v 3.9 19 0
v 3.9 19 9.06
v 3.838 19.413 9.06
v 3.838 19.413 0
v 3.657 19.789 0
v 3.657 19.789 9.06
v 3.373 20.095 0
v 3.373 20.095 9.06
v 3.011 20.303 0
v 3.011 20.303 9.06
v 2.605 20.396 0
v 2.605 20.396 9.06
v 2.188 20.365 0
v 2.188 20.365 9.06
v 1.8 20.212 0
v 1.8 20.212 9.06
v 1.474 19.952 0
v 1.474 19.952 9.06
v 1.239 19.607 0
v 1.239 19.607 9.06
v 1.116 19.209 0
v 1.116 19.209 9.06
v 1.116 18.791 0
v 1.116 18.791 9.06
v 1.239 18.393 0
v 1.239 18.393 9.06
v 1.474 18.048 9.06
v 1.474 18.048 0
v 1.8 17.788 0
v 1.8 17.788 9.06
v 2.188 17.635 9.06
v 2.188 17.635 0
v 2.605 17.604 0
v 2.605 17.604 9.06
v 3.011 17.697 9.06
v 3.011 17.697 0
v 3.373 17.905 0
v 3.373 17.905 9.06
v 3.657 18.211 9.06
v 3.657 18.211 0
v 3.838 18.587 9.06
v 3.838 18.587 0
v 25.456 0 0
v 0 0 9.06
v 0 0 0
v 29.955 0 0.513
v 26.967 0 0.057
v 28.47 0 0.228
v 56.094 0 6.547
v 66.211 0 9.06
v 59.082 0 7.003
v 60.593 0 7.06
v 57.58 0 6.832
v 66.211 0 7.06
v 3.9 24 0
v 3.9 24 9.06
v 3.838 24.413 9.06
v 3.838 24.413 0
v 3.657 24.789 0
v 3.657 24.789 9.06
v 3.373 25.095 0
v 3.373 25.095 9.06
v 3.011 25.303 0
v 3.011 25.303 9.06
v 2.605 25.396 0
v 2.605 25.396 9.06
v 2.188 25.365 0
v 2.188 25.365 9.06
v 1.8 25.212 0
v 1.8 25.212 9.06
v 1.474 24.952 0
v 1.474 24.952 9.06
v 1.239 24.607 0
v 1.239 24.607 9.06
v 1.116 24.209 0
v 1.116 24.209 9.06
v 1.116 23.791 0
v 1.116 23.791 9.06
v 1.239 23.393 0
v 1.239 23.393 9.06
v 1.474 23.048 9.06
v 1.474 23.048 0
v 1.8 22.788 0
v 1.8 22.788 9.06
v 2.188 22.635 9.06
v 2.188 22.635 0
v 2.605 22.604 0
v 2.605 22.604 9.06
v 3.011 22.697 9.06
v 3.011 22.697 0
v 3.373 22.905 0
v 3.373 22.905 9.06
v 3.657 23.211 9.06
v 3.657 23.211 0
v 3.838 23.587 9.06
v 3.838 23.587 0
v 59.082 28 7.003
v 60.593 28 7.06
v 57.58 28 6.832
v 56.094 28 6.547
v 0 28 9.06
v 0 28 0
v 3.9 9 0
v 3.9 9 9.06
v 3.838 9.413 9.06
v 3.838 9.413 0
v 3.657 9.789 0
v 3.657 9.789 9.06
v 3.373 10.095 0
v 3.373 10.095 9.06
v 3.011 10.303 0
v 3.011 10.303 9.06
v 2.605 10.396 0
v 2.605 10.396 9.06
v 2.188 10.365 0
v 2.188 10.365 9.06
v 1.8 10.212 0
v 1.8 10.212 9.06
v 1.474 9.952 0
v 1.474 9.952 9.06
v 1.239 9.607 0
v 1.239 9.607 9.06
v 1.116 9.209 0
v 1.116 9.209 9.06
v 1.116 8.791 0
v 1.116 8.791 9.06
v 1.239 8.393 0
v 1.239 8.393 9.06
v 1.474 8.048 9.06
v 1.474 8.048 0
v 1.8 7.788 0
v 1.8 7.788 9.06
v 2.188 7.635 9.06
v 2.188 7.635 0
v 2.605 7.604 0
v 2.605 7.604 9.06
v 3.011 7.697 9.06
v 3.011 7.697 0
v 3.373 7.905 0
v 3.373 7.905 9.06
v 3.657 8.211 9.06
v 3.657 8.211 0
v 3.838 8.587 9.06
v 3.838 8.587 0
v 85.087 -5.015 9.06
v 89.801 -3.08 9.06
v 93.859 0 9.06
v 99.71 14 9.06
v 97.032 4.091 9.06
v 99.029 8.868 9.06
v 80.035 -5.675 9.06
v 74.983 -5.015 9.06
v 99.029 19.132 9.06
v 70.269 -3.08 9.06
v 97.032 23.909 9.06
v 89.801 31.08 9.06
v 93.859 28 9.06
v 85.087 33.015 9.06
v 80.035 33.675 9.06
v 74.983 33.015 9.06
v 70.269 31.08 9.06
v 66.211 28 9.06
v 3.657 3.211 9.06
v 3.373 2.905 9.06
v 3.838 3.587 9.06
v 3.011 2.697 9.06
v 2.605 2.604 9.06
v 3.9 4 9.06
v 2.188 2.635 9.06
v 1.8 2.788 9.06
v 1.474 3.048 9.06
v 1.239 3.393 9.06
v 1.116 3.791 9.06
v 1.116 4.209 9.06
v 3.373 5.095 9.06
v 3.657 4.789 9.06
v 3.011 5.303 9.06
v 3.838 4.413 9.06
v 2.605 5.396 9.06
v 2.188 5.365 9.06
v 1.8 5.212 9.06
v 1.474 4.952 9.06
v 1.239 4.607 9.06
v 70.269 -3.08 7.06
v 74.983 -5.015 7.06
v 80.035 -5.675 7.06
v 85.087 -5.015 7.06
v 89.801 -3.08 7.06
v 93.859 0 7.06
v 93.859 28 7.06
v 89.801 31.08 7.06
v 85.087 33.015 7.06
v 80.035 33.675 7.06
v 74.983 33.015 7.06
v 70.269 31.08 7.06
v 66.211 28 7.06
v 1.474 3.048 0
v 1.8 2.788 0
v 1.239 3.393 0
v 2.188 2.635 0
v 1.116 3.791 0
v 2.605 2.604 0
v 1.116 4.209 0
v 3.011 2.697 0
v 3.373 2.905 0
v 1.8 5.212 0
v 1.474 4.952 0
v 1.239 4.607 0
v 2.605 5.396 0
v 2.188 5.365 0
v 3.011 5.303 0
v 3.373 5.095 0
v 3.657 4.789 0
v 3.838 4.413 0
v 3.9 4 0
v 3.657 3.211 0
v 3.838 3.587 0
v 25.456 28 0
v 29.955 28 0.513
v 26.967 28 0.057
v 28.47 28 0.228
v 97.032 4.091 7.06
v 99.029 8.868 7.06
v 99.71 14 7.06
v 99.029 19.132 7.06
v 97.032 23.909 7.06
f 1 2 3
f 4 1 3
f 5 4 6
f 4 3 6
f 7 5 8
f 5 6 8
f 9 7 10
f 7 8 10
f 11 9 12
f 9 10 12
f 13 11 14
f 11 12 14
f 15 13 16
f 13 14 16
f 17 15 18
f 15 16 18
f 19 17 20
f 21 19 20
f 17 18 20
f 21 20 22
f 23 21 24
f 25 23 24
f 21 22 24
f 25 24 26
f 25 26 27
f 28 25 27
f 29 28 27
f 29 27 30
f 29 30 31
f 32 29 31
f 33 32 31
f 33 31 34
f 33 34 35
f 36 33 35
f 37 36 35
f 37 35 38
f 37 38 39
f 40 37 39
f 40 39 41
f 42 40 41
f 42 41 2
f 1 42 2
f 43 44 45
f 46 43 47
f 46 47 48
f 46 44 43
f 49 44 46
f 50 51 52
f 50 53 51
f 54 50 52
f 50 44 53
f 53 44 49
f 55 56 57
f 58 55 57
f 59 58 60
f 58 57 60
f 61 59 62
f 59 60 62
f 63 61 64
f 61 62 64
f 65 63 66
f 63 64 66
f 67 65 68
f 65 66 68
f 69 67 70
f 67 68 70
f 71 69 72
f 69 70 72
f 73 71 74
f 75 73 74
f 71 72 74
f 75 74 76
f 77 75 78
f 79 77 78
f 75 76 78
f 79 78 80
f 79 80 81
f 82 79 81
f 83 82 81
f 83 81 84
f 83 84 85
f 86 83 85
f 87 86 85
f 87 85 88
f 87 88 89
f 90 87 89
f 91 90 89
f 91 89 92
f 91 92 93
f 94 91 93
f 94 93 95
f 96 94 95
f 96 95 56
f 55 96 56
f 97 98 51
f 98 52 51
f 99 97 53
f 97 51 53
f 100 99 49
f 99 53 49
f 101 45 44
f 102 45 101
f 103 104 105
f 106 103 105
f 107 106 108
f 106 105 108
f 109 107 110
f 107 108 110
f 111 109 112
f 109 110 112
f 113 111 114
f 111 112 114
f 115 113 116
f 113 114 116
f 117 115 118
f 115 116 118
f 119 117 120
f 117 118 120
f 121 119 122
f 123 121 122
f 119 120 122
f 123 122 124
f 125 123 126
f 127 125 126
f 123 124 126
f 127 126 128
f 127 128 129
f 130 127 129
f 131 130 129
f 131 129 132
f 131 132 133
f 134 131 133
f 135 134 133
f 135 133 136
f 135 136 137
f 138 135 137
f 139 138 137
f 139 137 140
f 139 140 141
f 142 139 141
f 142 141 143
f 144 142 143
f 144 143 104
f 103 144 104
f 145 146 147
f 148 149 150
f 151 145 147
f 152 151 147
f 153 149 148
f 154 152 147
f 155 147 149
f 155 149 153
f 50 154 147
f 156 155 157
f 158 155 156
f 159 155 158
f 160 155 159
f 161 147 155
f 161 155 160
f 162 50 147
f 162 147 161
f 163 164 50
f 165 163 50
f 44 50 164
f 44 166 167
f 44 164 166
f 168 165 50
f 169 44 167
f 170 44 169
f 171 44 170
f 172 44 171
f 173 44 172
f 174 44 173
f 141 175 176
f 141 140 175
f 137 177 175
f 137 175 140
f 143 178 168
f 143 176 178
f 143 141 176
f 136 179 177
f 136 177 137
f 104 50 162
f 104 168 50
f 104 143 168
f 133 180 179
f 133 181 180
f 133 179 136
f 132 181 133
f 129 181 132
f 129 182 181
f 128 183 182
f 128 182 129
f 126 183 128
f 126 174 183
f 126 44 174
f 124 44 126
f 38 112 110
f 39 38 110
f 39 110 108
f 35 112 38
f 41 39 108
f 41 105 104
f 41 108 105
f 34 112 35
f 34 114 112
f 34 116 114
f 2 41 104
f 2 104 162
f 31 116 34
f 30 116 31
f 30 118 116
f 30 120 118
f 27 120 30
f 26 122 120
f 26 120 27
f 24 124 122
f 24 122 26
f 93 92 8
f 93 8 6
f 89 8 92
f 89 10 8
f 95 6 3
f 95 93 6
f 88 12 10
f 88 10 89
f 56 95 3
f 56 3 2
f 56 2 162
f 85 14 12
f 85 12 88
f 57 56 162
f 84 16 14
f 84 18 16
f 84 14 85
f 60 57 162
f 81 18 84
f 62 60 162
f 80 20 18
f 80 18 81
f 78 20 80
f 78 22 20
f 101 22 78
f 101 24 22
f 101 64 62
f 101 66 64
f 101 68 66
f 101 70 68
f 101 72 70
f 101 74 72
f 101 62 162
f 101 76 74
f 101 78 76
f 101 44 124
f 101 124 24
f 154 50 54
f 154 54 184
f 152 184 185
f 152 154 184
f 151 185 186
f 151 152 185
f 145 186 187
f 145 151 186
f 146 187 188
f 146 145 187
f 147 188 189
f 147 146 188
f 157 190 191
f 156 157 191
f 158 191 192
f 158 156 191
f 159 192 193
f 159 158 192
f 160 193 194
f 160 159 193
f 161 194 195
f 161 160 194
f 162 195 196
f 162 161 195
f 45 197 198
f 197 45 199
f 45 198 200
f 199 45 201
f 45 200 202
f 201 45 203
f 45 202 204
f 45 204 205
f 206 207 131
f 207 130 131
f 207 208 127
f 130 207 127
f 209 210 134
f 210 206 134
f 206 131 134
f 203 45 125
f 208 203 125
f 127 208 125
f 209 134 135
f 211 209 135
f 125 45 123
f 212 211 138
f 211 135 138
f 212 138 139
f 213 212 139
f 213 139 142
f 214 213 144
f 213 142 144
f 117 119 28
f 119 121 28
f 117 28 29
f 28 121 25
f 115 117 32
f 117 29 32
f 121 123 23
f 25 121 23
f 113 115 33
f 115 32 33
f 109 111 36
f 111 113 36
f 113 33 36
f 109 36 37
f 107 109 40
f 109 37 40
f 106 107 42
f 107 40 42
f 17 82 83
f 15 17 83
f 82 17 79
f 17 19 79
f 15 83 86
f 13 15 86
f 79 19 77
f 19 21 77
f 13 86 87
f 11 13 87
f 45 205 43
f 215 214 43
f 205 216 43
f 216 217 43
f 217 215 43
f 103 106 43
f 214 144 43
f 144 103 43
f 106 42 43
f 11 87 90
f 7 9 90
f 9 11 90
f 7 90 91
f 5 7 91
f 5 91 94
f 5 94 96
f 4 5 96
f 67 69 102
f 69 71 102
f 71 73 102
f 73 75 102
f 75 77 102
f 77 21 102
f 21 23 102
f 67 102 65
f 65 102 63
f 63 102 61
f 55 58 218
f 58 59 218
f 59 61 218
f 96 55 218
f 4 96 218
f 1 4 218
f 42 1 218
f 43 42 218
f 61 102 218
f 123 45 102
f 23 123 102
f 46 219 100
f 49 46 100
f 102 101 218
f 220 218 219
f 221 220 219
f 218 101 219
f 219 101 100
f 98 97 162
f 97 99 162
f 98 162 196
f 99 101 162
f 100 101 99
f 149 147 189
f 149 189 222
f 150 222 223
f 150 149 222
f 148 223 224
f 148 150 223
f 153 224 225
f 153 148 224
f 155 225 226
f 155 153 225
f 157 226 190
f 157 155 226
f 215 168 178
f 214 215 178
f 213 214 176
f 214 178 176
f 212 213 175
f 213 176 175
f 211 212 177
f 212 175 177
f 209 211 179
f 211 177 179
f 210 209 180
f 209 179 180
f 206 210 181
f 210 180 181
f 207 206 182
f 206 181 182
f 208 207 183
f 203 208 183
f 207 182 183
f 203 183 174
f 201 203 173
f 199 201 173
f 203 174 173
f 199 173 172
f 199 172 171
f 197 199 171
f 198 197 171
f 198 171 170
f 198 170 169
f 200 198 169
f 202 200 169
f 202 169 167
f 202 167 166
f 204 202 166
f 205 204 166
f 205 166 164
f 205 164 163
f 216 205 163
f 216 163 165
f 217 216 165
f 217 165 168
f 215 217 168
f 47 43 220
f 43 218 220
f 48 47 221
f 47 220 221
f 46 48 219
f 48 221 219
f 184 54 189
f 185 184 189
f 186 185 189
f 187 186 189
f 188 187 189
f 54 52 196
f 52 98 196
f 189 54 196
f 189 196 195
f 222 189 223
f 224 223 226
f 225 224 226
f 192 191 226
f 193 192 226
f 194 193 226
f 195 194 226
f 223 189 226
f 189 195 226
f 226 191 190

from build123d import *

# Parameters (mm, degrees)
SKETCH1_W           = 15
SKETCH1_H           = 28
BOSS_EXTRUDE1_DEPTH = 9.06
SKETCH2_R           = 1.4
CUT_EXTRUDE1_DEPTH  = 26
SKETCH3_W           = 2
SKETCH3_H           = 28
BOSS_EXTRUDE2_DEPTH = 85
CHAMFER1_SIZE       = 10
CHAMFER1_SIZE_2     = 43.314758743
SKETCH4_R           = 19.675
BOSS_EXTRUDE3_DEPTH = 2
CUT_EXTRUDE3_START  = -2
CUT_EXTRUDE3_DEPTH  = 2
FILLET1_R           = 20


with BuildPart() as part:
    # Sketch1 → Boss-Extrude1 (new body)
    with BuildSketch(Plane.XY):
        with Locations((7.5, 14)):
            Rectangle(SKETCH1_W, SKETCH1_H)
    extrude(amount=BOSS_EXTRUDE1_DEPTH)

    # Sketch2 → Cut-Extrude1 (cut)
    with BuildSketch(Plane.XY.offset(9.06)):
        with Locations((2.5, 24)):
            Circle(SKETCH2_R)
        with Locations((2.5, 19)):
            Circle(SKETCH2_R)
        with Locations((2.5, 9)):
            Circle(SKETCH2_R)
        with Locations((2.5, 4)):
            Circle(SKETCH2_R)
    extrude(amount=-CUT_EXTRUDE1_DEPTH, mode=Mode.SUBTRACT)

    # Sketch3 → Boss-Extrude2 (add)
    with BuildSketch(Plane(origin=(15, 0, 0), x_dir=(0, 0, -1), z_dir=(1, 0, 0))):
        with Locations((-8.06, 14)):
            Rectangle(SKETCH3_W, SKETCH3_H)
    extrude(amount=BOSS_EXTRUDE2_DEPTH)

    # Chamfer1
    # the kernel refuses this chamfer: 43.314758743, 10 mm, written as the material it adds along each edge
    with BuildSketch(Plane(origin=(15, 28, 7.06), x_dir=(-0.16038219639928503, 0, -0.9870549888826565), z_dir=(0, -1, 0))) as chamfer1_piece_1_section:
        Polygon((CHAMFER1_SIZE * 0.987054988883, CHAMFER1_SIZE * 0.160382196399), (-CHAMFER1_SIZE_2 * 0.160382196399, CHAMFER1_SIZE_2 * 0.987054988879), (0, 0), align=None)
    chamfer1_piece_1 = extrude(amount=28, mode=Mode.PRIVATE)
    chamfer1_piece_1 = split(chamfer1_piece_1, bisect_by=Plane(origin=(31.447908445, 14, 0), z_dir=(0, 0, 1)), keep=Keep.TOP, mode=Mode.PRIVATE)
    add(chamfer1_piece_1)

    # Sketch4 → Boss-Extrude3 (add)
    with BuildSketch(Plane.XY.offset(9.06)):
        with Locations((80.035, 14)):
            Circle(SKETCH4_R)
    extrude(amount=-BOSS_EXTRUDE3_DEPTH)

    # Sketch5 → Cut-Extrude3 (cut)
    with BuildSketch(Plane(origin=(0, 0, 7.06), x_dir=(-1, 0, 0), z_dir=(0, 0, -1)).offset(CUT_EXTRUDE3_START)):
        with BuildLine():
            ThreePointArc((-93.859095811, 0), (-99.71, 14), (-93.859095811, 28))
            Line((-93.859095811, 28), (-100, 28))
            Line((-100, 28), (-100, 0))
            Line((-100, 0), (-93.859095811, 0))
        make_face()
    extrude(amount=CUT_EXTRUDE3_DEPTH, mode=Mode.SUBTRACT)

    # Fillet1
    fillet1_edges = [part.edges().sort_by_distance(p)[0] for p in [
        (58.314758743, 14, 7.06),
        (27.73453907, 14, 0),
    ]]
    fillet(fillet1_edges, radius=FILLET1_R)


solid = part.part
